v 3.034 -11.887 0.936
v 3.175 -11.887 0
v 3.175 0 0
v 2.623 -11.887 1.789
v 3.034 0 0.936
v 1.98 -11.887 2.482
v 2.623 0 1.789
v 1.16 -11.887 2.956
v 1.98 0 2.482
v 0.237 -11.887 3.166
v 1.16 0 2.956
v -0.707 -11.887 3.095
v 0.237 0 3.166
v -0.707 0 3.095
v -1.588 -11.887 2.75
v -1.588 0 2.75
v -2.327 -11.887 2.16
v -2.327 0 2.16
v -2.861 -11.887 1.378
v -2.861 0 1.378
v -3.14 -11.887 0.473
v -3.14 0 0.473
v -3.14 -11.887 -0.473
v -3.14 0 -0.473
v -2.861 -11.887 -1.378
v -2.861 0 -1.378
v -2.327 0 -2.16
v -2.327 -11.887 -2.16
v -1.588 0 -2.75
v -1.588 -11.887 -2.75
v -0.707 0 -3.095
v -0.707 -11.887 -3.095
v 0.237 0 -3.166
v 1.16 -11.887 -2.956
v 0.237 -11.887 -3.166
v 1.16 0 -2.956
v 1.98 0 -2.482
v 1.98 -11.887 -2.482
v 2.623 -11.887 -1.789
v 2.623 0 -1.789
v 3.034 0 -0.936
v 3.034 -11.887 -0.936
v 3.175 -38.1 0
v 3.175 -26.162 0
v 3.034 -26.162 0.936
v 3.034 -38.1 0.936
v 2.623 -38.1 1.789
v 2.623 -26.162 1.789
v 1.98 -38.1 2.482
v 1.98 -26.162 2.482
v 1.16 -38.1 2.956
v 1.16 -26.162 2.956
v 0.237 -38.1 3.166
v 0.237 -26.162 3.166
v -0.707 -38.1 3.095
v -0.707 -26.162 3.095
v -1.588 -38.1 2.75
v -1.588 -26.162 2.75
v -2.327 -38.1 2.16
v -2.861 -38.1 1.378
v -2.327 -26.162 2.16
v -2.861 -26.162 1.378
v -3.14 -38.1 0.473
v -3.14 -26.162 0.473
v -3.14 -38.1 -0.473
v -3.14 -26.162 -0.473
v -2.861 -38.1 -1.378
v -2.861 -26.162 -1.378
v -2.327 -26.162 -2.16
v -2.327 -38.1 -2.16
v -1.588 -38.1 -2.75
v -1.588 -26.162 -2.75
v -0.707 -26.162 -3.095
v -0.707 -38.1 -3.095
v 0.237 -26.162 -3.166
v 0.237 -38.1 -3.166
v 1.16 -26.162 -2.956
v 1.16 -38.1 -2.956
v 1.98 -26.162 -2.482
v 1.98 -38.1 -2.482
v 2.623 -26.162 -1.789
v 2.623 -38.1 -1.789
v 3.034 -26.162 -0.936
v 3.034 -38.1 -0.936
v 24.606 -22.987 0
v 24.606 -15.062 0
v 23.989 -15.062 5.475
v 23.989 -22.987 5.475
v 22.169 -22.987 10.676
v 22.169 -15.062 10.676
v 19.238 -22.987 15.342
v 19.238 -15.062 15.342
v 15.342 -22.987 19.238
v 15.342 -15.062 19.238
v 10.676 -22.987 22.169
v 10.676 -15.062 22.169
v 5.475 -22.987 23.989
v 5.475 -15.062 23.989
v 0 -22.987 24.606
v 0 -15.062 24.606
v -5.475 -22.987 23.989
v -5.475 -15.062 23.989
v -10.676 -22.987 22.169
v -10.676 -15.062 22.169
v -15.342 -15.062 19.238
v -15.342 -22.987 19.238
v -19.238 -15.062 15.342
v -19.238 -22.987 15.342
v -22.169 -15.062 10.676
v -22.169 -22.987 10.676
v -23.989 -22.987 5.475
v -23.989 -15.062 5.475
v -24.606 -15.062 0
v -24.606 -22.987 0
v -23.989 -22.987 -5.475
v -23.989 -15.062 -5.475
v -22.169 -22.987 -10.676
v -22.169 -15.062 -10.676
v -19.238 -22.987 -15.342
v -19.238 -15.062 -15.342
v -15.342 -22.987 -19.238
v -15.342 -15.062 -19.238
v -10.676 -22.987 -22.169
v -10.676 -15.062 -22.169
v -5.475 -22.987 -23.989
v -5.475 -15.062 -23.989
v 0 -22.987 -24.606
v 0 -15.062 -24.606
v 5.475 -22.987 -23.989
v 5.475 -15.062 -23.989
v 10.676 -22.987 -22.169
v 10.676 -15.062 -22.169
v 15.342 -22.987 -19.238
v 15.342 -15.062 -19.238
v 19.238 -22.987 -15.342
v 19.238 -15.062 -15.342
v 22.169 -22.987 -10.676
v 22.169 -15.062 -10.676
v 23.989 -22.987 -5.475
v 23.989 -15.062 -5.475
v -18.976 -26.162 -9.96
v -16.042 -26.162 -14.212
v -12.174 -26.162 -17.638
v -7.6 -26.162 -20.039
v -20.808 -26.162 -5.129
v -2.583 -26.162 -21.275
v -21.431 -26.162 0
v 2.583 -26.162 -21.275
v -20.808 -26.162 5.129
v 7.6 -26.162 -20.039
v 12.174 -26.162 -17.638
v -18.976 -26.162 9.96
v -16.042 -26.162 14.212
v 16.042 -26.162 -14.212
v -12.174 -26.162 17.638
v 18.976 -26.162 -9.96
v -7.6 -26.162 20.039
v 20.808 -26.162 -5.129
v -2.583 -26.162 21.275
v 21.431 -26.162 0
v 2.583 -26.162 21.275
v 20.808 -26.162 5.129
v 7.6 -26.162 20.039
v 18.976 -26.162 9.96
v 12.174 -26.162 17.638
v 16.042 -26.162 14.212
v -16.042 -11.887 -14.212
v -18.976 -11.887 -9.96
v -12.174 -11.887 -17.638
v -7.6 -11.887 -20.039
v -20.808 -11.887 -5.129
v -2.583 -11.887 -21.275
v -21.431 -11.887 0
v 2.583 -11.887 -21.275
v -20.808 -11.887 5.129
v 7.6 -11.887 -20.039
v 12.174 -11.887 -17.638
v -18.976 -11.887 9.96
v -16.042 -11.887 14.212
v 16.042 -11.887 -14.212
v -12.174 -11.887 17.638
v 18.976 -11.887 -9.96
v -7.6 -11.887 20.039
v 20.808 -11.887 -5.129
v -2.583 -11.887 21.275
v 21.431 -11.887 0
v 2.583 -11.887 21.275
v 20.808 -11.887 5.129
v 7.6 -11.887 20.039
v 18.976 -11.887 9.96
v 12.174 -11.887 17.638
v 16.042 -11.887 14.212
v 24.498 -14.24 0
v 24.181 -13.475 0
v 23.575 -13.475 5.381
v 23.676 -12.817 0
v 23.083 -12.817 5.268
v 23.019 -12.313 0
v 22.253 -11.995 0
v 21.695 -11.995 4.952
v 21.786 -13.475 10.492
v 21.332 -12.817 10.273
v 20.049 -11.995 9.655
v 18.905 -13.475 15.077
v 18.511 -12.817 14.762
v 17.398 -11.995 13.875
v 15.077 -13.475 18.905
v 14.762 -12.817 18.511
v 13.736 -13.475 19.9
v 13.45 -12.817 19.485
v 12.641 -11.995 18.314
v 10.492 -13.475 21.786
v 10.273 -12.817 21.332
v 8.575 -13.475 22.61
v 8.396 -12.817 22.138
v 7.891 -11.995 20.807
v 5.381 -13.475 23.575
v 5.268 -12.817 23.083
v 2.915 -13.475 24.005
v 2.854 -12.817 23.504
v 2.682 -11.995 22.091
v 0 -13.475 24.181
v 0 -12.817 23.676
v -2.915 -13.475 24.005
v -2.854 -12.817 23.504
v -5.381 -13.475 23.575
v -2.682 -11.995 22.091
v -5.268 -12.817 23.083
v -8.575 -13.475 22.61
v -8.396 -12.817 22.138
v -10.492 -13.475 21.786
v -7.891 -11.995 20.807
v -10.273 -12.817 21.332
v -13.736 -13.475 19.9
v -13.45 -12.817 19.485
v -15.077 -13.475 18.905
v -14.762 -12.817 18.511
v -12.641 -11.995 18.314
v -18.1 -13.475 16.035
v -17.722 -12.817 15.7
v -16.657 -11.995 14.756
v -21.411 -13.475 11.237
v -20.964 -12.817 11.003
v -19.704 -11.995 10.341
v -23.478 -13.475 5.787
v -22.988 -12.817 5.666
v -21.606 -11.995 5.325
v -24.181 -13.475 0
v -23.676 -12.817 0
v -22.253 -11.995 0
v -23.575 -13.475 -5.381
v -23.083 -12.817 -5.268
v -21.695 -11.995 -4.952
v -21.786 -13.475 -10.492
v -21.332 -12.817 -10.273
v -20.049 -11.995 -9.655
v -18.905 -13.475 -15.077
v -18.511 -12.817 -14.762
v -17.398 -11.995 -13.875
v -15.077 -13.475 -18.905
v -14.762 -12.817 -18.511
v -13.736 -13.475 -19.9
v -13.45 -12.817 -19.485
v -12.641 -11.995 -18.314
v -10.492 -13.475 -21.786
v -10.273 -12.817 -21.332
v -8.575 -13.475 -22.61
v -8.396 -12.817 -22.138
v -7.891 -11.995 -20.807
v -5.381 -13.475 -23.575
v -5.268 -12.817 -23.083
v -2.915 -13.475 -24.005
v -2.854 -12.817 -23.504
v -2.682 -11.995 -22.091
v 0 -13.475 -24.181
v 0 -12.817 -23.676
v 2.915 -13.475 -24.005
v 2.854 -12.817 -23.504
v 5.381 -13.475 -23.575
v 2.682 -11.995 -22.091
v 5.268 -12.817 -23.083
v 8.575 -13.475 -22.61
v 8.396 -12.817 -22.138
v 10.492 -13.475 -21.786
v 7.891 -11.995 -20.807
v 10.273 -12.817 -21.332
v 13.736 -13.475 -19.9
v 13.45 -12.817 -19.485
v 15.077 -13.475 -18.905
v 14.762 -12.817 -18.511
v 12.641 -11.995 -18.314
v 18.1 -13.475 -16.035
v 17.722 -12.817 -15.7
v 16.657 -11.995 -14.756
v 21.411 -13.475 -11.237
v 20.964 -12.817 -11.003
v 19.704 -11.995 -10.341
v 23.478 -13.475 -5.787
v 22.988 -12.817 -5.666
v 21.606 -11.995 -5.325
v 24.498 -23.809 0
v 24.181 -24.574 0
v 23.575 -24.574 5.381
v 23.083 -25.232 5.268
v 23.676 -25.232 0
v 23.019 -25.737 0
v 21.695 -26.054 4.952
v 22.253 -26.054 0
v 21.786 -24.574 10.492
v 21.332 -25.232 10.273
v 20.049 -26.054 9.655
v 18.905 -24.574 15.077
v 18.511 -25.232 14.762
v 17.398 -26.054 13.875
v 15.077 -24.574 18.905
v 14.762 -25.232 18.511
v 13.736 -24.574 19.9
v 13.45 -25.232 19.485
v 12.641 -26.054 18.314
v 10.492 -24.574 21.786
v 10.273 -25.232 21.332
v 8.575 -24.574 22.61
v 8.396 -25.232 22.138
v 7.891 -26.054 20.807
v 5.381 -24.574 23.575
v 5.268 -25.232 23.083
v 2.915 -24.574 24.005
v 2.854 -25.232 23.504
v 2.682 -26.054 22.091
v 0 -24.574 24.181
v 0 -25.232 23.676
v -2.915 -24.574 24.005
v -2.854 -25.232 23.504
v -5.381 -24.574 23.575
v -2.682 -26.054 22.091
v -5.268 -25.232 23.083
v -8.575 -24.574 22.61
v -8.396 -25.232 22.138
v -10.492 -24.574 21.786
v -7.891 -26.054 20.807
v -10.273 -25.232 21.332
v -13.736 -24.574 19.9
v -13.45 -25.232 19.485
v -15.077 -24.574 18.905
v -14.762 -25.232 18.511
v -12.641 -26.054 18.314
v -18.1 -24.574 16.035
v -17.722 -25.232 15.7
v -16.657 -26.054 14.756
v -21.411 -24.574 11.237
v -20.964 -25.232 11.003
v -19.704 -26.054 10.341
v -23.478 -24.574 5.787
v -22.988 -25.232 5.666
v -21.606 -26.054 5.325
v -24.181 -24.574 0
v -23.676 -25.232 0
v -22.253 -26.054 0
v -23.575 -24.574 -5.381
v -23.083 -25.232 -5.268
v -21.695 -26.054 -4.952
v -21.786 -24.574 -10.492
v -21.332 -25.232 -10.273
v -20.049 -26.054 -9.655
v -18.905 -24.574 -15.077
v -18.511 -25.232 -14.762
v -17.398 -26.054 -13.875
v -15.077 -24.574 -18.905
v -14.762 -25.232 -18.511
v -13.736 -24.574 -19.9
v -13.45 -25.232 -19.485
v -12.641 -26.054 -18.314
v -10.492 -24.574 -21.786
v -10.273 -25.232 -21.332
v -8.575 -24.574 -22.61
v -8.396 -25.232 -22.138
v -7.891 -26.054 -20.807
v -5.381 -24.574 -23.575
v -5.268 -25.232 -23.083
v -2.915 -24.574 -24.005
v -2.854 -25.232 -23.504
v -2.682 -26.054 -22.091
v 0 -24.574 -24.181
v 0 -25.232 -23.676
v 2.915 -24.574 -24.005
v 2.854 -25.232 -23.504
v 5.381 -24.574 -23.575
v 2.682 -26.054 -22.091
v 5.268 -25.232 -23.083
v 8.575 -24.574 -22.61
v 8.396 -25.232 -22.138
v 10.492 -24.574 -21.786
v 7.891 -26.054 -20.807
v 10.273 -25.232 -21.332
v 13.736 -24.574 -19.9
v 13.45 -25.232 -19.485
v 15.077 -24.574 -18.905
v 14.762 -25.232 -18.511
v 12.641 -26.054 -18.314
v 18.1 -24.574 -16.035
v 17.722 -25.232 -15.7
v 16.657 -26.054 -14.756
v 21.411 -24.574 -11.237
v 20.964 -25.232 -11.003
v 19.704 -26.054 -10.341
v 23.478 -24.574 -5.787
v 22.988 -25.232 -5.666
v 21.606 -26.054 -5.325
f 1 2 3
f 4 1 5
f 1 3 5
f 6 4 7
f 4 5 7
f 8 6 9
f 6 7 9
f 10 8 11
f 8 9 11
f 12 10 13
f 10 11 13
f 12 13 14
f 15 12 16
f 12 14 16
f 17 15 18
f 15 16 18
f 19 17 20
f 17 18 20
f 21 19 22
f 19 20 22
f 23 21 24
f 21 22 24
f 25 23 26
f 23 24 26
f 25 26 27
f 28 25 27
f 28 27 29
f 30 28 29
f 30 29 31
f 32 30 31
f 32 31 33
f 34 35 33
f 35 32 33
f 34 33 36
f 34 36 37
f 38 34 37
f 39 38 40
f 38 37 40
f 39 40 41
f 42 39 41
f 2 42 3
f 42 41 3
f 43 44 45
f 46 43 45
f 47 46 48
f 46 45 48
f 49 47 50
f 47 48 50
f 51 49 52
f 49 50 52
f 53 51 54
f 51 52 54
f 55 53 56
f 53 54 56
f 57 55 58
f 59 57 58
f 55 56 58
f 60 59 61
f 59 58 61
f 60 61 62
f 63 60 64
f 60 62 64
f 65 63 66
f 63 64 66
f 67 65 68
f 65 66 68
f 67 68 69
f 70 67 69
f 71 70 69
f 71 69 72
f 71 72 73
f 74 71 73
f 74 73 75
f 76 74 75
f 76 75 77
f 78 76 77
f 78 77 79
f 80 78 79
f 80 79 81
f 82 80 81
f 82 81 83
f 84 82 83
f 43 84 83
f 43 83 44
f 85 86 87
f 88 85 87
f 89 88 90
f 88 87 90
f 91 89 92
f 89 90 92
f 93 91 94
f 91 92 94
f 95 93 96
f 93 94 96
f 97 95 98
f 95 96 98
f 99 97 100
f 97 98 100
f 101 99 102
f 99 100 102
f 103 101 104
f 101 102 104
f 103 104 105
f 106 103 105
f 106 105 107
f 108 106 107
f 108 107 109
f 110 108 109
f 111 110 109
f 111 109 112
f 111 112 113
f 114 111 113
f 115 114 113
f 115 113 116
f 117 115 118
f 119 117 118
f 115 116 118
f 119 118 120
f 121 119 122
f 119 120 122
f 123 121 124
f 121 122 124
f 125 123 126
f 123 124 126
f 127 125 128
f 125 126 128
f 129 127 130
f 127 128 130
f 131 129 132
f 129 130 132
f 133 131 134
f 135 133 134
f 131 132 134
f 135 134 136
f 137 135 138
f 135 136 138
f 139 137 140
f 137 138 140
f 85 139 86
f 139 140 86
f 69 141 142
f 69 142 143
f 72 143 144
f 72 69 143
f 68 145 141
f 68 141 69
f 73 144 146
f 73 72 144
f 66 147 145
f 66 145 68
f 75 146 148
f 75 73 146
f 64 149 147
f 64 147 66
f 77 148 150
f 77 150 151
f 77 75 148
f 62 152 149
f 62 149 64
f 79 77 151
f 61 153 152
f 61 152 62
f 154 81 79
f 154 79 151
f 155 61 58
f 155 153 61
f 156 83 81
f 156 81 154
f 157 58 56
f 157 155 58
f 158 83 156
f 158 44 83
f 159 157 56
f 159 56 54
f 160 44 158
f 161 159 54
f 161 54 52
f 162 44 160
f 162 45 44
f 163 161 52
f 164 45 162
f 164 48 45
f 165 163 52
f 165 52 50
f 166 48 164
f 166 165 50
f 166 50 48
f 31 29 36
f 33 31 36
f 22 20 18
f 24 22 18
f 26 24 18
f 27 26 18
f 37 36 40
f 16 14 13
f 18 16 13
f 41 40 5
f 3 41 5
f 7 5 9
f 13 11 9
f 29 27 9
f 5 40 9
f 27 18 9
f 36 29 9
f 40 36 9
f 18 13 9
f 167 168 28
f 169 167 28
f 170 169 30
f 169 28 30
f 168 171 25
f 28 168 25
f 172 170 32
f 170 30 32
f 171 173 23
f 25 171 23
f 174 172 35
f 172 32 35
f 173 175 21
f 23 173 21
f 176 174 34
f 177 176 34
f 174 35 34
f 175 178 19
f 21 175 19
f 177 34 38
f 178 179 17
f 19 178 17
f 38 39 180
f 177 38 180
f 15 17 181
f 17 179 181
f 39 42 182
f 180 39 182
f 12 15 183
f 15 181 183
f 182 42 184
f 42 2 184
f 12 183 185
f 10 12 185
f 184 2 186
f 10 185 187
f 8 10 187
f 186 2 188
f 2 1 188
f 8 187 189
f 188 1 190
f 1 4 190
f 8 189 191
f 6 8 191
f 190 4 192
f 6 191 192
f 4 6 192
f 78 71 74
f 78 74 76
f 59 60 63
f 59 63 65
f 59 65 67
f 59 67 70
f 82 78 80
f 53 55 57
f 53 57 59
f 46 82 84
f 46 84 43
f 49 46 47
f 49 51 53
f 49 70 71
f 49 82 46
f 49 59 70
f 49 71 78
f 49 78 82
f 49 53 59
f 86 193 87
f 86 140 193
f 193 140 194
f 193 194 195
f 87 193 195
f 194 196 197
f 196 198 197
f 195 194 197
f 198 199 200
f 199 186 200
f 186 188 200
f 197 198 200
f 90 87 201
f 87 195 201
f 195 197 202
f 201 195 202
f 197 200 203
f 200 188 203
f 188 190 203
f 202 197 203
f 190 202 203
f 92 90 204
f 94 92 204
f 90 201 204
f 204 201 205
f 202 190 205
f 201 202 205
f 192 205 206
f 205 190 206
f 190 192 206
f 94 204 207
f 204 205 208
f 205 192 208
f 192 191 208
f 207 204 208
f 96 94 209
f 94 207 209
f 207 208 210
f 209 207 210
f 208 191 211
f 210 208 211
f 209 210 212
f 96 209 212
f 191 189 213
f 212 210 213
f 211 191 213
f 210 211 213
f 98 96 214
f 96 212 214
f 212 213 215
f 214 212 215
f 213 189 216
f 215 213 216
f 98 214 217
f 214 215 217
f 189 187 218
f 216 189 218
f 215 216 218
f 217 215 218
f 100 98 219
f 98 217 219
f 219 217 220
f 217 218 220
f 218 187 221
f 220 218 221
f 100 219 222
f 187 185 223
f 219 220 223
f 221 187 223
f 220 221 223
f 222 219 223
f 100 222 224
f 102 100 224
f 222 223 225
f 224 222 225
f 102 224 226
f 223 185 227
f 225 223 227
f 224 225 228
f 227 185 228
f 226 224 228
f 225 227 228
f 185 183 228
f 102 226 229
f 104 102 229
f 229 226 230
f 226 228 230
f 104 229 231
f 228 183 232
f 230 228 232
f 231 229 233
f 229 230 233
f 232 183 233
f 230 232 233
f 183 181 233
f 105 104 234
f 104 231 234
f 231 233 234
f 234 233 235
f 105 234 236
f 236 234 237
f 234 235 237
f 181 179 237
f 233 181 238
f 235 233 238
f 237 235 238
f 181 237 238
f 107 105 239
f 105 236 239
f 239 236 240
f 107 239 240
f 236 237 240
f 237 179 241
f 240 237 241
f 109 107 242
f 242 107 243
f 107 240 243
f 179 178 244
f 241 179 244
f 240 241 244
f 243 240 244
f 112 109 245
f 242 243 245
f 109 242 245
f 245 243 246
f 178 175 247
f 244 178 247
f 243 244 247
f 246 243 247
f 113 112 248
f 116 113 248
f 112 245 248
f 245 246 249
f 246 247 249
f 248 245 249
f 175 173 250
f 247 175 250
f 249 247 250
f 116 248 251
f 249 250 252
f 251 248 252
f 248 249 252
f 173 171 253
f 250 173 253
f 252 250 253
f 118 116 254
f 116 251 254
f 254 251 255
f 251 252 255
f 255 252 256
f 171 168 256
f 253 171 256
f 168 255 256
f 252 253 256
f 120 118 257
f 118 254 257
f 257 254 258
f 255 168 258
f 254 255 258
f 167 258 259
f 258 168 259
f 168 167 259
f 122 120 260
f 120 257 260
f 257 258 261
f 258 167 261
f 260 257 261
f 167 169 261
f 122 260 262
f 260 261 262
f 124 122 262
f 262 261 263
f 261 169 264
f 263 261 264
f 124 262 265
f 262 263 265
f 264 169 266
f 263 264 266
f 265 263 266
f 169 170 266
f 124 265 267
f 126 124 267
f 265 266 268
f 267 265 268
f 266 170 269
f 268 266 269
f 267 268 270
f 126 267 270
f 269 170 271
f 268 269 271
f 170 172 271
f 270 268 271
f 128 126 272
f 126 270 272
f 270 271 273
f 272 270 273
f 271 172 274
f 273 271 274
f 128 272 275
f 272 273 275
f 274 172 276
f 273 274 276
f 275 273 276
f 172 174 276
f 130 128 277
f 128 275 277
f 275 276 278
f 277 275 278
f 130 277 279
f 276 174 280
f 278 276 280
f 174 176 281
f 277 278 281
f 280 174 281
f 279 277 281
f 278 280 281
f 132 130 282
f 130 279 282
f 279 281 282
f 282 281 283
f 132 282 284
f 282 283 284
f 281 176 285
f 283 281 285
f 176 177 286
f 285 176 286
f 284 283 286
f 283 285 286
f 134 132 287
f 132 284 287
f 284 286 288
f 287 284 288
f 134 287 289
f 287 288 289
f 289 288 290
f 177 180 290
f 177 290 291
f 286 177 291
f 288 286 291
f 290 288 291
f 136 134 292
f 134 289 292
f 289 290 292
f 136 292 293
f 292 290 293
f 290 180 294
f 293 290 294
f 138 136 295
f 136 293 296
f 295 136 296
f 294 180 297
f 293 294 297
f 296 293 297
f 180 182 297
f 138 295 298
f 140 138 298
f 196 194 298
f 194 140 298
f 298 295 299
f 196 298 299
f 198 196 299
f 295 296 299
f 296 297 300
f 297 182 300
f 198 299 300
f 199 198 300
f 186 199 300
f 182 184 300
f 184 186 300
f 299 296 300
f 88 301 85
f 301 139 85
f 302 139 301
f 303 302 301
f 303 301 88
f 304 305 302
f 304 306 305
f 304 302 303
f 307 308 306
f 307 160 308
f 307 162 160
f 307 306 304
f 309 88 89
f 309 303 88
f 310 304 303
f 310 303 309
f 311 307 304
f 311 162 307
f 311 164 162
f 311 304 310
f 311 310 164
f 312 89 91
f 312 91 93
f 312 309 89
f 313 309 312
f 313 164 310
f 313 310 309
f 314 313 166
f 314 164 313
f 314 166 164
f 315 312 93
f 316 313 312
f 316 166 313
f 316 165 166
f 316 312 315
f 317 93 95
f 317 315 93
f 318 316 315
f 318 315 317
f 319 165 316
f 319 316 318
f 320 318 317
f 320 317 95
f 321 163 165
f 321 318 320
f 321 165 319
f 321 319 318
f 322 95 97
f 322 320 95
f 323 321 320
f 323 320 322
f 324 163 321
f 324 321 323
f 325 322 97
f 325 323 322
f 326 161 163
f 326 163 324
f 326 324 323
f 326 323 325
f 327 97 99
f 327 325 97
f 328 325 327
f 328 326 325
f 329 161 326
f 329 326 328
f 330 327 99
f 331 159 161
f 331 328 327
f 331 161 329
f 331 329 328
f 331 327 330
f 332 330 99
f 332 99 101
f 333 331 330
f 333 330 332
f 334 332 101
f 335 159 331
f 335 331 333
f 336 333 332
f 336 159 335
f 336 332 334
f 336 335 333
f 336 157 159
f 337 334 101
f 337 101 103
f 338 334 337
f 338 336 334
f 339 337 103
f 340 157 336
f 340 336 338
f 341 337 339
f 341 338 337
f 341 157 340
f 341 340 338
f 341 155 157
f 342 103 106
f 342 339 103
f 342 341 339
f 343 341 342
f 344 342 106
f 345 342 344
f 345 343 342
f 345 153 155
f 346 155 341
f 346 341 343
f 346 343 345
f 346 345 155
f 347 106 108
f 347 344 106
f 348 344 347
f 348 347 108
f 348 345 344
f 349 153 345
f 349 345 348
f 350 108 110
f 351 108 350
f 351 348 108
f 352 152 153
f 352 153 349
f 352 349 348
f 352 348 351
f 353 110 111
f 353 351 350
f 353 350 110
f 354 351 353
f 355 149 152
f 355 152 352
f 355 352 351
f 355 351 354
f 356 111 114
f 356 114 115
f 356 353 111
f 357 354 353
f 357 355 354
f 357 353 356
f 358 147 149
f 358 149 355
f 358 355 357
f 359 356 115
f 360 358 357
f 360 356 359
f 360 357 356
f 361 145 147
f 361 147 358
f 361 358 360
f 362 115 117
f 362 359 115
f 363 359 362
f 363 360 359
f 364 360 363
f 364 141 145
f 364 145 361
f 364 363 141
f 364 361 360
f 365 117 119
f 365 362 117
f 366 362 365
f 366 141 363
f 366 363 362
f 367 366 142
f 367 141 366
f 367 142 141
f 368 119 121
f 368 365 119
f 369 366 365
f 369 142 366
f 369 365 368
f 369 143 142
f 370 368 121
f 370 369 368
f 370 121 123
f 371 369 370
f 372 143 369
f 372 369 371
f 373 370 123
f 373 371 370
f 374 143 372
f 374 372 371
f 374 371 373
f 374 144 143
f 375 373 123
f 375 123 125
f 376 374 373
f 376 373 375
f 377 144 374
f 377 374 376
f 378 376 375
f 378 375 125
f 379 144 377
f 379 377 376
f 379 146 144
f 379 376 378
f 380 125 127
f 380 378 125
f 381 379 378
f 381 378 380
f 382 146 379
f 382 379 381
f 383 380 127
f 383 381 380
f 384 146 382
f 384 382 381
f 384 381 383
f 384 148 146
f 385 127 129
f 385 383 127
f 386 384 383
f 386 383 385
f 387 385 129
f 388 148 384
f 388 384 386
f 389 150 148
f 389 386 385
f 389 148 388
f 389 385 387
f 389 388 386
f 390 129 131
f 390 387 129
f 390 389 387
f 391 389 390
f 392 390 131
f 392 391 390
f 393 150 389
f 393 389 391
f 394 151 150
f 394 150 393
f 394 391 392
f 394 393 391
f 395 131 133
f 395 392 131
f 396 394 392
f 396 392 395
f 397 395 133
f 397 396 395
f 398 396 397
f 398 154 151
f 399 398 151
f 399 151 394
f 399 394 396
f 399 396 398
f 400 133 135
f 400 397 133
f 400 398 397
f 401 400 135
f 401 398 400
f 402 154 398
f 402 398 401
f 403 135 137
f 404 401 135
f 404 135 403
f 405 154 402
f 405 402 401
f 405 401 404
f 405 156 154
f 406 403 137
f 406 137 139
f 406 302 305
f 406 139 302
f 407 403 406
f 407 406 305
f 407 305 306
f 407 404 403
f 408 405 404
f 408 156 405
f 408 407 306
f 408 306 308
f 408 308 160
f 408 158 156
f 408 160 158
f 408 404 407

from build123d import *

# Parameters (mm, degrees)
F0_R     = 3.175
F1_DEPTH = 38.1
F3_START = 11.8872
F2_R     = 24.60625
F3_DEPTH = 14.2748
F4_R     = 3.175
F5_R     = 3.175


with BuildPart() as f1:
    # F0 (on Front) → F1 (new body)
    with BuildSketch(Plane.XZ):
        Circle(F0_R)
    extrude(amount=F1_DEPTH)

    # F2 (on Front) → F3 (join)
    with BuildSketch(Plane.XZ.offset(F3_START)):
        Circle(F2_R)
    extrude(amount=F3_DEPTH)

    # F4
    f4_edges = [f1.edges().sort_by_distance(p)[0] for p in [
        (-24.60625, -26.162, 0),
    ]]
    fillet(f4_edges, radius=F4_R)

    # F5
    f5_edges = [f1.edges().sort_by_distance(p)[0] for p in [
        (-24.60625, -11.8872, 0),
    ]]
    fillet(f5_edges, radius=F5_R)


solid = f1.part
